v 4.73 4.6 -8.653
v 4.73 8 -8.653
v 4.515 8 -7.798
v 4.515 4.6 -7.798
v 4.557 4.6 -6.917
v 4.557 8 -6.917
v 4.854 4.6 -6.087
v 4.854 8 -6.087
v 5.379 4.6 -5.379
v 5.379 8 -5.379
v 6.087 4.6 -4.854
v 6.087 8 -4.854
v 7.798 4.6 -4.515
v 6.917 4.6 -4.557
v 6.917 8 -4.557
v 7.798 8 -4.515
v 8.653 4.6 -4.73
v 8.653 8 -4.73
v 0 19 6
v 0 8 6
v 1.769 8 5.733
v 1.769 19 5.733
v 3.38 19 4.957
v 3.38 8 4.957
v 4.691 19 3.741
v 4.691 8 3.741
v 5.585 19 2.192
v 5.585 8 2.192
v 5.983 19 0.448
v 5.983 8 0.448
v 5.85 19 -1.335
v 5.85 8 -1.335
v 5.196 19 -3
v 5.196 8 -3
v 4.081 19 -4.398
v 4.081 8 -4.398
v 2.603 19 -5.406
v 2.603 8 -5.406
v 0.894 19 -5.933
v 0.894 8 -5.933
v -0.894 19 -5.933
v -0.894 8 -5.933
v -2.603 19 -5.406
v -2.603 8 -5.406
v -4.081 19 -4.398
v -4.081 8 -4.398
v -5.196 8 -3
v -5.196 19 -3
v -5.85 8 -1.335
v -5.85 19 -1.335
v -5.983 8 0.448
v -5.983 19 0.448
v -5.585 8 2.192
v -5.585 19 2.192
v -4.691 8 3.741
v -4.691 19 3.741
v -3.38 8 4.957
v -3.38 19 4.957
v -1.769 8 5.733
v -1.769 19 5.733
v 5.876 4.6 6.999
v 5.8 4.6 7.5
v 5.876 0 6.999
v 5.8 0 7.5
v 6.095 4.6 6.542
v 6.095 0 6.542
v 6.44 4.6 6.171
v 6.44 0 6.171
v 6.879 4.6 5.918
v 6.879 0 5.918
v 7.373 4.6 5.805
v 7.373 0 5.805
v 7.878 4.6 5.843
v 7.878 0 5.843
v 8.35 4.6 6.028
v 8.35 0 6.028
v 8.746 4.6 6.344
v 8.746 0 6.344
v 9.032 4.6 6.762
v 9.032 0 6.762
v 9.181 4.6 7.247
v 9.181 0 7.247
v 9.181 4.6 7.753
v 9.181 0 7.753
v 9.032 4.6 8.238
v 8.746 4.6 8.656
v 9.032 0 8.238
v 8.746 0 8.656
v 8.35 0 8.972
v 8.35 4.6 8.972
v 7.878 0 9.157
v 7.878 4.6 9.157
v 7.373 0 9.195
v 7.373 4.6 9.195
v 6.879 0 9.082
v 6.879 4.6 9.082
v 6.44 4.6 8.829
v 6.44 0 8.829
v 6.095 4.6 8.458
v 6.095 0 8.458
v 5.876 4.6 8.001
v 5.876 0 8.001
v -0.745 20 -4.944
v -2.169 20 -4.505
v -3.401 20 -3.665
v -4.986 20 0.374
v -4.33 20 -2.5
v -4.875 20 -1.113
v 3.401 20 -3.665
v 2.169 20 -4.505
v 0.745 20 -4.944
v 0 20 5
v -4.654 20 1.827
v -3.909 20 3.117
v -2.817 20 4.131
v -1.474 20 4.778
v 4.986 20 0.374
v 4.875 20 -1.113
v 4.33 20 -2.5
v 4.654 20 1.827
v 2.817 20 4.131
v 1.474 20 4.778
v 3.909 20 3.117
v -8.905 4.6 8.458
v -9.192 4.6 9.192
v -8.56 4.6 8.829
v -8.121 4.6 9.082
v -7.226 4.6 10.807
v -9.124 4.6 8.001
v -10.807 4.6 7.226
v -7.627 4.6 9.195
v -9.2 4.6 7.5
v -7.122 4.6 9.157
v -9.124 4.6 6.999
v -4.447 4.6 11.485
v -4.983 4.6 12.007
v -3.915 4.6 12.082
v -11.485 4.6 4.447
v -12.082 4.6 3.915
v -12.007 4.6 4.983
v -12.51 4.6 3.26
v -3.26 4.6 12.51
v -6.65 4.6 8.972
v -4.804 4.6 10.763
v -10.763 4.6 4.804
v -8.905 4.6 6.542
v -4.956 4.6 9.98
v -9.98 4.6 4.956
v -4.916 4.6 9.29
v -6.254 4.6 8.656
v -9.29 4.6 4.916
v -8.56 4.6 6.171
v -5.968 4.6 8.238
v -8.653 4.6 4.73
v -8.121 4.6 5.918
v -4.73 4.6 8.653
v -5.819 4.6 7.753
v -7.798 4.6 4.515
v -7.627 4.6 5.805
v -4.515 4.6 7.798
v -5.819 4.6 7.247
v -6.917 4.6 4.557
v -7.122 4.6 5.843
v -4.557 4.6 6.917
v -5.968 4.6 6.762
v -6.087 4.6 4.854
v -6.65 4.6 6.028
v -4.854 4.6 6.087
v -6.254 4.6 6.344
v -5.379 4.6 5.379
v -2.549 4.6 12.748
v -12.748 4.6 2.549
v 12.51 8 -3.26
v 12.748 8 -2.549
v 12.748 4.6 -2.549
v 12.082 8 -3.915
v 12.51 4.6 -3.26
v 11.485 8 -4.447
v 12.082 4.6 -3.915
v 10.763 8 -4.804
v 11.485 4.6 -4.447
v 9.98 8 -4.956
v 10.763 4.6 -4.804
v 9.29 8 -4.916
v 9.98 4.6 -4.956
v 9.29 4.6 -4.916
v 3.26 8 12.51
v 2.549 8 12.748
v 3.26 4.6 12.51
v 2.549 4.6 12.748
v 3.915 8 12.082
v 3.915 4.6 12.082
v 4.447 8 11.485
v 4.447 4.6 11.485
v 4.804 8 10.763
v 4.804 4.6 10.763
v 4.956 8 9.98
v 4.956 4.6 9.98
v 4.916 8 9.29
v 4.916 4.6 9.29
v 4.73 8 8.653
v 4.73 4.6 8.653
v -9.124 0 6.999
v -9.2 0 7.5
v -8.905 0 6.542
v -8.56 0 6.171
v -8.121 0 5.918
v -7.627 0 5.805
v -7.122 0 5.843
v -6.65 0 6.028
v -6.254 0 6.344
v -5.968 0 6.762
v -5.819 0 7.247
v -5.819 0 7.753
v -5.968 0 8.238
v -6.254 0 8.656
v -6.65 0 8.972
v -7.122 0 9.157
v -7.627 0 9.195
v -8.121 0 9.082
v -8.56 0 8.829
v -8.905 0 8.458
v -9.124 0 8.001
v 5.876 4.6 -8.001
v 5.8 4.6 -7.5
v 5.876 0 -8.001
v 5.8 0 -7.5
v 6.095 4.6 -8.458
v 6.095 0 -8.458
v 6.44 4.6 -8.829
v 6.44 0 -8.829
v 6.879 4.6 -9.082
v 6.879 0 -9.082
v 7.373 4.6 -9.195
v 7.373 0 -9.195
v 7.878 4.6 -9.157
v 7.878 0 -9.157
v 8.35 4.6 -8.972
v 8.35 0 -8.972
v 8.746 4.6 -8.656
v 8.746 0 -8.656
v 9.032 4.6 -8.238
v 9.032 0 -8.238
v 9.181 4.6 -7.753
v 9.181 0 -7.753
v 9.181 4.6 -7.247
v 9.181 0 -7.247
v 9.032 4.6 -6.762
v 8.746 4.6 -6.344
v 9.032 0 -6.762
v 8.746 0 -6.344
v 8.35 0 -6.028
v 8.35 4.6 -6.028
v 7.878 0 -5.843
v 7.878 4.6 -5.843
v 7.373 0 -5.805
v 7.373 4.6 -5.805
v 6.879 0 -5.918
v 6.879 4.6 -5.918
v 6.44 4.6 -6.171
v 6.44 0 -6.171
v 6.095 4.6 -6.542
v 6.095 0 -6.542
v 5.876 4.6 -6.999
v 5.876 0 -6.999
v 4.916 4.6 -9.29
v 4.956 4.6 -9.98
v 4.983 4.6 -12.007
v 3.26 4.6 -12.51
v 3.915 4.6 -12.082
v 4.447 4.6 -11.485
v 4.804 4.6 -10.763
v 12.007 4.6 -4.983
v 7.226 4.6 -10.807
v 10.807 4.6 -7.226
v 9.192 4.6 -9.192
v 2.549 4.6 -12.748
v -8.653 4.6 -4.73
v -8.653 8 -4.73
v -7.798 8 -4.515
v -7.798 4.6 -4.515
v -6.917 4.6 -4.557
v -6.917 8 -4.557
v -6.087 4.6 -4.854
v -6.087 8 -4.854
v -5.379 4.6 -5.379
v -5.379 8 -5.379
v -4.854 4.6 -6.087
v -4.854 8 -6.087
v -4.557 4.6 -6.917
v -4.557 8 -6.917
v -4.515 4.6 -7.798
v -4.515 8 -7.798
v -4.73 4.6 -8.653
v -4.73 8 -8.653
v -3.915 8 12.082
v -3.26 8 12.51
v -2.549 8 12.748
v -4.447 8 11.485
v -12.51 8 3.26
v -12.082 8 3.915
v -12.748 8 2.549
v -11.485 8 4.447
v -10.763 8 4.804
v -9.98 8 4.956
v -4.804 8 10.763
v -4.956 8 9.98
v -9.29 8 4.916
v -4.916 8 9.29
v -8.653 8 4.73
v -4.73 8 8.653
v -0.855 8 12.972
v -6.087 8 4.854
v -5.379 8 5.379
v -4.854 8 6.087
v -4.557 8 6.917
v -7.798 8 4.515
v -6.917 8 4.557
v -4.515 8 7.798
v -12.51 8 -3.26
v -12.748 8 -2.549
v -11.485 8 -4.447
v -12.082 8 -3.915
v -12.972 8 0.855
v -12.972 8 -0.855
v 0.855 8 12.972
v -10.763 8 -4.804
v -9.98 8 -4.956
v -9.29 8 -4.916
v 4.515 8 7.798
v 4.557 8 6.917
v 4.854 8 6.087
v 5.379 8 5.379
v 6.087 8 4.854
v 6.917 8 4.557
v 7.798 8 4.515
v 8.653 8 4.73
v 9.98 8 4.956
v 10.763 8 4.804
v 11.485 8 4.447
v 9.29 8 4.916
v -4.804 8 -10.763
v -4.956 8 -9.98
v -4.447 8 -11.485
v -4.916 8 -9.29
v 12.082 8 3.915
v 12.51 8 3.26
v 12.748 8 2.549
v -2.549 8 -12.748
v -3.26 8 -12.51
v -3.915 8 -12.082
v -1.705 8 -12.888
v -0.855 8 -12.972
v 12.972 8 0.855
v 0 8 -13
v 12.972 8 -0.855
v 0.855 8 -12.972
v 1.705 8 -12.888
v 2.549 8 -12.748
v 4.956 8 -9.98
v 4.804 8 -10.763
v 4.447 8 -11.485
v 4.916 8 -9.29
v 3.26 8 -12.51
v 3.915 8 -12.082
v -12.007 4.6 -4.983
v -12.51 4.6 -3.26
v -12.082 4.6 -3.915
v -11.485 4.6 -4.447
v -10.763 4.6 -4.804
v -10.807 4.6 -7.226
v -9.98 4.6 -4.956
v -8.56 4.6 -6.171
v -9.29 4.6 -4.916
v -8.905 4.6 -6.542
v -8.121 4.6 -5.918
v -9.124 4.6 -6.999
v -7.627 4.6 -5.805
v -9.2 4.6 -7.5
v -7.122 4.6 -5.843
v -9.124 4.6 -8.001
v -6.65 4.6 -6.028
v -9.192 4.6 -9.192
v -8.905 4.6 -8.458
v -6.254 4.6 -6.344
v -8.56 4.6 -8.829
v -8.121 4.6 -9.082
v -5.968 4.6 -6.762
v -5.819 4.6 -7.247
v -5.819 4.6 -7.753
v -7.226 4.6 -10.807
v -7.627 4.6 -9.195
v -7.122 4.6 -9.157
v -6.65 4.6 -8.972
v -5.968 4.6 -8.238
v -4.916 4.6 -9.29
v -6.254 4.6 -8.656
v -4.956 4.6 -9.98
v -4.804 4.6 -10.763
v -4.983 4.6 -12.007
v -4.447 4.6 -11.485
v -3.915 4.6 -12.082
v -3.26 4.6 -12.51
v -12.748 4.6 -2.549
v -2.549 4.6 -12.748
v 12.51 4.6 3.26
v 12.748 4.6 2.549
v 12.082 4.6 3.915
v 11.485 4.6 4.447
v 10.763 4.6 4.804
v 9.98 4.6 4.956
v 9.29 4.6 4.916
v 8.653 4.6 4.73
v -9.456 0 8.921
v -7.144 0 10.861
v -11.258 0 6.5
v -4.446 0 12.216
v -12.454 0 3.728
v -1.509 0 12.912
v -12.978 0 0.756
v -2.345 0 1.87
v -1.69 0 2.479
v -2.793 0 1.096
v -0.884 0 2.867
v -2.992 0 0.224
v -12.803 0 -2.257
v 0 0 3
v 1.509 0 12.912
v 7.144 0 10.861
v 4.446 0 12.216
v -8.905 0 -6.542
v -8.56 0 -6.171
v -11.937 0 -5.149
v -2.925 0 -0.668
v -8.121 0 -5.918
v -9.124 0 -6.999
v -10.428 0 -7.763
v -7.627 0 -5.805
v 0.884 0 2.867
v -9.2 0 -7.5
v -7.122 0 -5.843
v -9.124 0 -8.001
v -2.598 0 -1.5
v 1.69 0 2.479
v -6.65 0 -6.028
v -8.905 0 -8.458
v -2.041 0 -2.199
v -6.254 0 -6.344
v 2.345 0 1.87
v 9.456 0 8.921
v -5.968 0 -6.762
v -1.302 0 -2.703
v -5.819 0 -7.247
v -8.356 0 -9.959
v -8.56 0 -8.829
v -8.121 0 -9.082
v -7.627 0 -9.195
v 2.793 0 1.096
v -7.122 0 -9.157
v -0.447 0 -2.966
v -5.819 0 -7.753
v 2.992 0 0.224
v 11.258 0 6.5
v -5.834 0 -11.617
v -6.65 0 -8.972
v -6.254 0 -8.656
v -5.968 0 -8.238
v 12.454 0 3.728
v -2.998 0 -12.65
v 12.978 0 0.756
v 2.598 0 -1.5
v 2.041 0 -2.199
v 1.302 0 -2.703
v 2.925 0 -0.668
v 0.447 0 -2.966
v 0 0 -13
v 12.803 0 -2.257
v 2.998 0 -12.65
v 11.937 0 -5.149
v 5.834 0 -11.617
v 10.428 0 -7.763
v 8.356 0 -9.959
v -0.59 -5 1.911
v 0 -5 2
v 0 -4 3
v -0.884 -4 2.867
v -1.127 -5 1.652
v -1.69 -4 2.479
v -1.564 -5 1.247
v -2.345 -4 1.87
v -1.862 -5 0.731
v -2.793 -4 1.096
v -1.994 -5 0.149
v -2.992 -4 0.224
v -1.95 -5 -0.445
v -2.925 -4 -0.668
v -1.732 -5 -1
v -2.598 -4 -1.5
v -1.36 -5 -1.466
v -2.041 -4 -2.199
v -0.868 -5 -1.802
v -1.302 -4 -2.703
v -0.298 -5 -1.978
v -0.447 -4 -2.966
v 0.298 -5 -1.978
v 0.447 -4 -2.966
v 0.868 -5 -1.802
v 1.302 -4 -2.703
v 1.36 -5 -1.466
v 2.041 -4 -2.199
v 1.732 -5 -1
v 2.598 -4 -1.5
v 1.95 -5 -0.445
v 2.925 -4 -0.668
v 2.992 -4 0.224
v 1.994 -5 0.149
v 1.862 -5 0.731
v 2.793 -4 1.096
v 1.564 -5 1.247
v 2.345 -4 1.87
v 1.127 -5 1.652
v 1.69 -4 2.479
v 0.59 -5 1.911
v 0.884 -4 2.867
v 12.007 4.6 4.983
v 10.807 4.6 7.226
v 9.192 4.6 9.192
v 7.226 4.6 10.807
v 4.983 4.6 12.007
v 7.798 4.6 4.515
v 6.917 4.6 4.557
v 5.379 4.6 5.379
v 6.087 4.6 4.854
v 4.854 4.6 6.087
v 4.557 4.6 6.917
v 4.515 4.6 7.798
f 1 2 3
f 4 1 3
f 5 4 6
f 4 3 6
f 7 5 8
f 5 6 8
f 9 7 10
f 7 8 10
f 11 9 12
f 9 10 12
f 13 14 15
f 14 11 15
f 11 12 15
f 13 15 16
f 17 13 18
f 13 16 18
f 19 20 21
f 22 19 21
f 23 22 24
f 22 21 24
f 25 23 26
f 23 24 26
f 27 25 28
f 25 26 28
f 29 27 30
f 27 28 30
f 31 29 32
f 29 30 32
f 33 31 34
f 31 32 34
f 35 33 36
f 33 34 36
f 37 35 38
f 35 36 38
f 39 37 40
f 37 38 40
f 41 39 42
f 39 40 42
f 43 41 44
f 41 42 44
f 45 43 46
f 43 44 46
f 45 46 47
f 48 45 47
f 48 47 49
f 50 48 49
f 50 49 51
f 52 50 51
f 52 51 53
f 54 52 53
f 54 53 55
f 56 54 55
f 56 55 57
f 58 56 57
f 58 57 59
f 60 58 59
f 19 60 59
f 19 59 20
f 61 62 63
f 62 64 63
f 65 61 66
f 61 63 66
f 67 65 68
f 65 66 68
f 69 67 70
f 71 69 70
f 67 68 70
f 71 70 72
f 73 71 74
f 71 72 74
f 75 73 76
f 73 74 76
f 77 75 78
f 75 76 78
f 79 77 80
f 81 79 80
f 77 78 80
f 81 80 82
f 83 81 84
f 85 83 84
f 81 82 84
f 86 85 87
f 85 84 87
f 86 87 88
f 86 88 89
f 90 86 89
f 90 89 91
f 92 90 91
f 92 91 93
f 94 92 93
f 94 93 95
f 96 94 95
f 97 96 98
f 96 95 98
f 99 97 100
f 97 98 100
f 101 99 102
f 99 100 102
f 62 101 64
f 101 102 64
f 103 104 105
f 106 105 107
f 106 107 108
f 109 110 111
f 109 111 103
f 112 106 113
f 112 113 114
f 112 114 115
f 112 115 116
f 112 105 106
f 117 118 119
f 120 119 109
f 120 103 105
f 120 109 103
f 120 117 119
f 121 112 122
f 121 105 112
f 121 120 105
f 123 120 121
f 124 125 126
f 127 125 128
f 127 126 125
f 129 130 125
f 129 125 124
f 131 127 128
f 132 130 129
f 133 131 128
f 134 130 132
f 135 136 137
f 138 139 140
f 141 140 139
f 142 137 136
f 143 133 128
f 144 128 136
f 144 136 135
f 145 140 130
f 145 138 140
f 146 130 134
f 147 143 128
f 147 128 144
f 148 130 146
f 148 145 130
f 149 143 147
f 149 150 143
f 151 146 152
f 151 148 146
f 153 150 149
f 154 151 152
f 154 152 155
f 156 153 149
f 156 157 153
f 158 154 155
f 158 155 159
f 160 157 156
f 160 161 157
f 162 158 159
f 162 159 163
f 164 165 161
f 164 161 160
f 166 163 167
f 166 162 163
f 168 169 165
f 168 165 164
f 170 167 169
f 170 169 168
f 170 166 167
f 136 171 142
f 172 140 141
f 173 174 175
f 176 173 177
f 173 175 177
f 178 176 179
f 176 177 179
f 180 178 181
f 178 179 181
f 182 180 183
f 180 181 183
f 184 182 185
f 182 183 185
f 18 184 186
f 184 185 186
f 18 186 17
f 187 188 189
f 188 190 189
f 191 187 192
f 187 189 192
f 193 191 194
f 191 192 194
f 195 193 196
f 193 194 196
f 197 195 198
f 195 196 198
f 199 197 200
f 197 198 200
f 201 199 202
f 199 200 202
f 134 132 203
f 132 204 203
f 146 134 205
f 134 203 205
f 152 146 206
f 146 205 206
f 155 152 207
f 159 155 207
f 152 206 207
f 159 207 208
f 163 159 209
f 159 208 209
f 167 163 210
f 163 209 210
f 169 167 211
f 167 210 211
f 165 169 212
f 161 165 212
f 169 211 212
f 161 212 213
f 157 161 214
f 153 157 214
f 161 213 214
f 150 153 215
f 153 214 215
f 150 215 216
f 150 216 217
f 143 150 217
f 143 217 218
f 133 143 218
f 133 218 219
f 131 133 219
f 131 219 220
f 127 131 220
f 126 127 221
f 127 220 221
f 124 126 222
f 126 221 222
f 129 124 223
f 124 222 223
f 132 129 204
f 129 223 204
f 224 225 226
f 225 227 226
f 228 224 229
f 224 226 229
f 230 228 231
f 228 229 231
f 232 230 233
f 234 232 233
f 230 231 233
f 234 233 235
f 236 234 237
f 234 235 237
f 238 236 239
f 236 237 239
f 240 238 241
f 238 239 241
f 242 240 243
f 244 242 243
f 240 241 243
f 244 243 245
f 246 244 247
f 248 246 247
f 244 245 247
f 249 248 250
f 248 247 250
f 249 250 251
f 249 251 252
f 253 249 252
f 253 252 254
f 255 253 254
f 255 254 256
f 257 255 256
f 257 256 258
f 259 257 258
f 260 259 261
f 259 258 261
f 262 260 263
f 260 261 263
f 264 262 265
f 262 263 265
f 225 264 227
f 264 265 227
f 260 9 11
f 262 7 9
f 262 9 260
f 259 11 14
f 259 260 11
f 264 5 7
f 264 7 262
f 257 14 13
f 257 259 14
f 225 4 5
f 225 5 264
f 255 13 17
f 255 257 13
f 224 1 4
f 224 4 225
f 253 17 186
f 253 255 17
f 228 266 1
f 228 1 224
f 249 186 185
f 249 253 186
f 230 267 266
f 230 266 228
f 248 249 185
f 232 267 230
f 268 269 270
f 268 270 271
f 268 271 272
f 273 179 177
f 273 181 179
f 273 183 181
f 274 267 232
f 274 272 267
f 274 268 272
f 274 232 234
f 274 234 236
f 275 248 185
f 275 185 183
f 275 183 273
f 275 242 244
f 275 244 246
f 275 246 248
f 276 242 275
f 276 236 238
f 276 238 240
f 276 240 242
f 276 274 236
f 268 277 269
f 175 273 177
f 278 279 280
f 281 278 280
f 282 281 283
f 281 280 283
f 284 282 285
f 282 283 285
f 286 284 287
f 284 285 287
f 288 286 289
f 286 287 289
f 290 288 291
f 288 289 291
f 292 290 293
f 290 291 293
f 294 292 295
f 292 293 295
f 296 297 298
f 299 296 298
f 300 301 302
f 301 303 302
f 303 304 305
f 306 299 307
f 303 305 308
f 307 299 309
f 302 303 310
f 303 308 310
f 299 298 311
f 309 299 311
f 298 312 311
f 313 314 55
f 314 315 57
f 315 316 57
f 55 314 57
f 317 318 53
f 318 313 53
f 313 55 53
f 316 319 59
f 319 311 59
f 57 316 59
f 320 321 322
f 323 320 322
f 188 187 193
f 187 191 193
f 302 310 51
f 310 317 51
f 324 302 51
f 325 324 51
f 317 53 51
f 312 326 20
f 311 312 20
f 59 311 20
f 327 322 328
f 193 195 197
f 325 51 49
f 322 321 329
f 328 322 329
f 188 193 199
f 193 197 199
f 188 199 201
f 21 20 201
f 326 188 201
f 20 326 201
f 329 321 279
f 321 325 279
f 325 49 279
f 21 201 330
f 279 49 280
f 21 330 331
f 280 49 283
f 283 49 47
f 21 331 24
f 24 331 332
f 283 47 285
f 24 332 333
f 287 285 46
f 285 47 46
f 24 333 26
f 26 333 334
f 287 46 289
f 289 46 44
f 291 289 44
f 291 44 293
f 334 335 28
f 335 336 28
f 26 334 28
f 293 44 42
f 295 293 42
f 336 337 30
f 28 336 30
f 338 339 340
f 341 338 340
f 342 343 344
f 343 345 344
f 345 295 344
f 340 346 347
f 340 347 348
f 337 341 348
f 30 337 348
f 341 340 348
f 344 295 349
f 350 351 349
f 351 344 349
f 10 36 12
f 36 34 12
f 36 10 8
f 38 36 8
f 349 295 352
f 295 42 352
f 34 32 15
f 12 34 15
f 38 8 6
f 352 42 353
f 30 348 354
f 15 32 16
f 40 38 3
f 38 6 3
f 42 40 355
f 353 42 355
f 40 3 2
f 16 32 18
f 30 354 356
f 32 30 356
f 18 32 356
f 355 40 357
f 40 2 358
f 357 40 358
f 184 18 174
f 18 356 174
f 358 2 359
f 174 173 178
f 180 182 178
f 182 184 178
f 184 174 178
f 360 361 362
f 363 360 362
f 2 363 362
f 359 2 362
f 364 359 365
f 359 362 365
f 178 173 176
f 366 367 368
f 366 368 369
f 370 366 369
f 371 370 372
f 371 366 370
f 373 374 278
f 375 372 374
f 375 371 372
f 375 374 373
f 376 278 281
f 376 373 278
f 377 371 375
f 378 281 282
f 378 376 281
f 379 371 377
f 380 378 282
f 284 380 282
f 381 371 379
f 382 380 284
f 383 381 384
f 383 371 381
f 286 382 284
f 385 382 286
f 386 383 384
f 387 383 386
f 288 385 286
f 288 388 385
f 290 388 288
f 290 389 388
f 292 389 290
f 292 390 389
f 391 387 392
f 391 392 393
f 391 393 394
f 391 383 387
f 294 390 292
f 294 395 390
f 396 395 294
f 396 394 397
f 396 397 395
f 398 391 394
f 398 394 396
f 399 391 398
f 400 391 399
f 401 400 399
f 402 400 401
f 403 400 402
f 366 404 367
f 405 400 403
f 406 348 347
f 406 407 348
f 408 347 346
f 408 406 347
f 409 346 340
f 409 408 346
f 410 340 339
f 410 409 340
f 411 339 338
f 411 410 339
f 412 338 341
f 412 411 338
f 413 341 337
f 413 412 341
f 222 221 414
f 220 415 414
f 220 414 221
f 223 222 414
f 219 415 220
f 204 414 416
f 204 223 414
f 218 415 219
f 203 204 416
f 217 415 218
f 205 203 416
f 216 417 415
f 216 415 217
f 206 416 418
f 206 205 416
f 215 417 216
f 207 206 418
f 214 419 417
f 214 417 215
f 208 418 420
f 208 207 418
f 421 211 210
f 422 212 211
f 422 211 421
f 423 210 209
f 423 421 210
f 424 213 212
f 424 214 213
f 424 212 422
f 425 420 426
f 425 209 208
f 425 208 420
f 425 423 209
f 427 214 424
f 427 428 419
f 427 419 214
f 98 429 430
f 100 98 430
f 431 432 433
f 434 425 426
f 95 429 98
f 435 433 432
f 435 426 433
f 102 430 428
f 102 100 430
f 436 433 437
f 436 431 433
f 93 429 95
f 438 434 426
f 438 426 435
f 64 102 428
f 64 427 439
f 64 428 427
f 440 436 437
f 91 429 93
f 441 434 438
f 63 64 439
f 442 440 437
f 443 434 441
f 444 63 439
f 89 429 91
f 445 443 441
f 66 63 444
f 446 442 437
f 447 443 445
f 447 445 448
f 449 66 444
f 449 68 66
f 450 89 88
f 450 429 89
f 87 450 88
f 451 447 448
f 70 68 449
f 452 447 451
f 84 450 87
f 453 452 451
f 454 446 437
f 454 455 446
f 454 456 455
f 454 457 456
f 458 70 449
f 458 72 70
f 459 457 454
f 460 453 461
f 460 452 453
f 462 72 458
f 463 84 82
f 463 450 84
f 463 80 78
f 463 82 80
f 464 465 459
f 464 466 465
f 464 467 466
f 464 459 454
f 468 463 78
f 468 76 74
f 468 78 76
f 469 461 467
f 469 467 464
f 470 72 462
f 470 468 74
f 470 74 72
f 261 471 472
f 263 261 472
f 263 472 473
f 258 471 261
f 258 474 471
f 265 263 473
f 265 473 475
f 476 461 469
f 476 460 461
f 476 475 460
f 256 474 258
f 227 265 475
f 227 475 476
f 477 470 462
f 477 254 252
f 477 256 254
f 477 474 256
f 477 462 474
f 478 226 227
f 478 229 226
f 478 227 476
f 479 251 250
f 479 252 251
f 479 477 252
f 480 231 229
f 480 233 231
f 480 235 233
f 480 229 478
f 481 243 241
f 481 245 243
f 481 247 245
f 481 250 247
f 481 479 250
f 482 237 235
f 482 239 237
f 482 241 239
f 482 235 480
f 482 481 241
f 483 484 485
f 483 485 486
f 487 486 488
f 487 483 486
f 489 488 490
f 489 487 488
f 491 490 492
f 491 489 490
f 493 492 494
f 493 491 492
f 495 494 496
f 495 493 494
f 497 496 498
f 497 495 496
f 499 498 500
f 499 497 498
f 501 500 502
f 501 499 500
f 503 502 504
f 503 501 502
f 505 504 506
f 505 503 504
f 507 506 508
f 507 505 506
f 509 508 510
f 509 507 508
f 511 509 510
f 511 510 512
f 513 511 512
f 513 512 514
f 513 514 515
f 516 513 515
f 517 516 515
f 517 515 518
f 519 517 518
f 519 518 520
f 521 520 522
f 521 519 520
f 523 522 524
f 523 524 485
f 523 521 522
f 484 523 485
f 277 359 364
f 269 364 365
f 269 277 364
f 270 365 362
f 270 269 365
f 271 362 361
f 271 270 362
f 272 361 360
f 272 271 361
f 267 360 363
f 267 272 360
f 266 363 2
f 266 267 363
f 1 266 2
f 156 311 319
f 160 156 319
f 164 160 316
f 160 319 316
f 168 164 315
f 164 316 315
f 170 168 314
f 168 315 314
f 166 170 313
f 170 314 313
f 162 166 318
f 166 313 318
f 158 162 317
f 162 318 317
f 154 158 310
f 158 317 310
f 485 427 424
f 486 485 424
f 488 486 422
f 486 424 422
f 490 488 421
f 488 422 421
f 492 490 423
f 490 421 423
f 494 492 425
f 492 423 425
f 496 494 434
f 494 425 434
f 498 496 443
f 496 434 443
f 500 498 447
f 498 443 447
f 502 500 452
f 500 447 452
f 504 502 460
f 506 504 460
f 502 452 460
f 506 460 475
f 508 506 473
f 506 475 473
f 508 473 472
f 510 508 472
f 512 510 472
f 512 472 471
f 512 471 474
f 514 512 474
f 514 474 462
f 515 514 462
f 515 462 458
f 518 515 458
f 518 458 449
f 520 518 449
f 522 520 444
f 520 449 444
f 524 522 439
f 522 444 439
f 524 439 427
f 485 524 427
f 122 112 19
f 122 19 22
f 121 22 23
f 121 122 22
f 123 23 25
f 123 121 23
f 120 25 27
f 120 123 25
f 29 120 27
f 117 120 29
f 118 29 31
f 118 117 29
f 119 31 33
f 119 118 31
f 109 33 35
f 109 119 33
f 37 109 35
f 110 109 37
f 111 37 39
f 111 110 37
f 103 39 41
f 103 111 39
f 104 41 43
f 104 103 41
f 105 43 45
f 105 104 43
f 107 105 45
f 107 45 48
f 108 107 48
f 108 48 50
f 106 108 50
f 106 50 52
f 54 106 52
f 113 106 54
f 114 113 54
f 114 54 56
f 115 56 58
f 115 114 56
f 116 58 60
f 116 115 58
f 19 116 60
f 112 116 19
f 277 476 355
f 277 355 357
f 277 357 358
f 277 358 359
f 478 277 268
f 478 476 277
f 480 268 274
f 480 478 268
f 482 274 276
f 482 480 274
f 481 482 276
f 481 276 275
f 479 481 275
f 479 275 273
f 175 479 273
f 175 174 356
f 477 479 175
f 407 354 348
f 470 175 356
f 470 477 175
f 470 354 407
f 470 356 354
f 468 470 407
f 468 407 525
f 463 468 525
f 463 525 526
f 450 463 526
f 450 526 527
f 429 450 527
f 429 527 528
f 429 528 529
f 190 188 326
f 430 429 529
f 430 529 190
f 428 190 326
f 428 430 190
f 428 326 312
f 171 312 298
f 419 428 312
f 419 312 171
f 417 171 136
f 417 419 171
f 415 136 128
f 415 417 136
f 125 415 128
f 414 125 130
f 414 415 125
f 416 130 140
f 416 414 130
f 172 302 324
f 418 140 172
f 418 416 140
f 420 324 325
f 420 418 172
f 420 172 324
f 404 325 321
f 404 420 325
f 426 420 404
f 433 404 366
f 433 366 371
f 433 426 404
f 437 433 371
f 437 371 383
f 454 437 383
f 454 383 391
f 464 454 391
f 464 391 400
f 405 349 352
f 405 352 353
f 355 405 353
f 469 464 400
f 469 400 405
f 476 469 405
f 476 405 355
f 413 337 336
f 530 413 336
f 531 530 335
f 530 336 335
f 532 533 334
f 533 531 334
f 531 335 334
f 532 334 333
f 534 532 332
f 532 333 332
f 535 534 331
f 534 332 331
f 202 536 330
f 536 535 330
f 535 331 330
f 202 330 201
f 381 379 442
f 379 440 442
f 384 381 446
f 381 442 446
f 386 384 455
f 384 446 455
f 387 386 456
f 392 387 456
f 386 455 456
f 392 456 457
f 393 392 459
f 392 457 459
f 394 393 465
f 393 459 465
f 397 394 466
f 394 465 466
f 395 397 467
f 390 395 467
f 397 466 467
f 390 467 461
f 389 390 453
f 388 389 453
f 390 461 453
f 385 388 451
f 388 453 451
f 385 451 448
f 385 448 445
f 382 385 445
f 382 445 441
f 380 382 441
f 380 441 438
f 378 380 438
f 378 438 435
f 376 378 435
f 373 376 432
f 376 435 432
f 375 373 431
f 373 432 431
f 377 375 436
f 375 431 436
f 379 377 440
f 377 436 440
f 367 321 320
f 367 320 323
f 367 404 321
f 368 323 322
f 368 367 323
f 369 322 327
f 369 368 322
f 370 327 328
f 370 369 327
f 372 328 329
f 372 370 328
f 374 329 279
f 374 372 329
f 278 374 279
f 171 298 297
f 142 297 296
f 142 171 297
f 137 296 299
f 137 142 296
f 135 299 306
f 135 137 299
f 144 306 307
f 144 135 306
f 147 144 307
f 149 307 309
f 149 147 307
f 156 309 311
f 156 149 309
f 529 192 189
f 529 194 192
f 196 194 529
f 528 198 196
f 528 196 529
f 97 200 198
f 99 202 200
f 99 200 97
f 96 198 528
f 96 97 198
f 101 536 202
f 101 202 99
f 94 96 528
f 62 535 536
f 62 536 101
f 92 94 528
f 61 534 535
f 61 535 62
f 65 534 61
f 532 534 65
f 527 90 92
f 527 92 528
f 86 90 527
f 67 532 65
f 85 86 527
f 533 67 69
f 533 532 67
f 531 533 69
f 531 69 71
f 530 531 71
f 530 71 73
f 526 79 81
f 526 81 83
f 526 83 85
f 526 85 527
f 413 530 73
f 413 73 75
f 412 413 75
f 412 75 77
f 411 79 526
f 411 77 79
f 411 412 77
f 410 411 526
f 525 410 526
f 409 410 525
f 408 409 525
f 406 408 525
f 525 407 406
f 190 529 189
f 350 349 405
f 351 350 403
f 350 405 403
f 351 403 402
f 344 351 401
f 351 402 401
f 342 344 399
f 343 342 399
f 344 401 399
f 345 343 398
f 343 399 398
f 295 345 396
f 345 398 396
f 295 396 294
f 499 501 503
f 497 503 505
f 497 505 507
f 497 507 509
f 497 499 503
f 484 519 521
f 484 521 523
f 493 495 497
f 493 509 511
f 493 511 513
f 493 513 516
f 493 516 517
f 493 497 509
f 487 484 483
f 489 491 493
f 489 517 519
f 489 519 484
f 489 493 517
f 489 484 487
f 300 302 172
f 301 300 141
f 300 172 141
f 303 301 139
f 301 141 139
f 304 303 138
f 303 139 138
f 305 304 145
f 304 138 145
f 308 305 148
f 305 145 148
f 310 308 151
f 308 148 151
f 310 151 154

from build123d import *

# Parameters (mm, degrees)
SKETCH1_R                                            = 6
BOSS_EXTRUDE1_DEPTH                                  = 20
SKETCH3_R                                            = 13
BOSS_EXTRUDE2_DEPTH                                  = 8
CBORE_FOR_M3_HEXAGON_SOCKET_HEAD_CAP_SCR_D           = 3.4
CBORE_FOR_M3_HEXAGON_SOCKET_HEAD_CAP_SCR_CBORE_D     = 6
CBORE_FOR_M3_HEXAGON_SOCKET_HEAD_CAP_SCR_CBORE_DEPTH = 3.4
FILLET1_R                                            = 3
CHAMFER1_SIZE                                        = 1
SKETCH7_R                                            = 3
BOSS_EXTRUDE3_DEPTH                                  = 5
CHAMFER2_SIZE                                        = 1


with BuildPart() as part:
    # Sketch1 → Boss-Extrude1 (new body)
    with BuildSketch(Plane(origin=(0, 0, 0), x_dir=(1, 0, 0), z_dir=(0, 1, 0))):
        with Locations(Location((0, 0, 0), (0, 0, 270))):
            Circle(SKETCH1_R)
    extrude(amount=BOSS_EXTRUDE1_DEPTH)

    # Sketch3 → Boss-Extrude2 (add)
    with BuildSketch(Plane.XZ):
        with Locations(Location((0, 0, 0), (0, 0, 270))):
            Circle(SKETCH3_R)
    extrude(amount=-BOSS_EXTRUDE2_DEPTH)

    # CBORE for M3 Hexagon socket head cap screws1 (through all)
    with Locations(Plane(origin=(0, 8, 0), x_dir=(1, 0, 0), z_dir=(0, 1, 0))):
        with Locations((-7.5, 7.5), (-7.5, -7.5), (7.5, -7.5), (7.5, 7.5)):
            CounterBoreHole(CBORE_FOR_M3_HEXAGON_SOCKET_HEAD_CAP_SCR_D / 2, CBORE_FOR_M3_HEXAGON_SOCKET_HEAD_CAP_SCR_CBORE_D / 2, CBORE_FOR_M3_HEXAGON_SOCKET_HEAD_CAP_SCR_CBORE_DEPTH)

    # Fillet1
    fillet1_edges = [part.edges().sort_by_distance(p)[0] for p in [
        (10.495089529, 6.3, -7.671577138),
        (7.671577138, 6.3, -10.495089529),
        (7.671577138, 6.3, 10.495089529),
        (10.495089529, 6.3, 7.671577138),
        (-7.671577138, 6.3, 10.495089529),
        (-10.495089529, 6.3, 7.671577138),
        (-7.671577138, 6.3, -10.495089529),
        (-10.495089529, 6.3, -7.671577138),
    ]]
    fillet(fillet1_edges, radius=FILLET1_R)

    # Chamfer1
    chamfer1_edges = [part.edges().sort_by_distance(p)[0] for p in [
        (0, 20, -6),
    ]]
    chamfer(chamfer1_edges, length=CHAMFER1_SIZE)

    # Sketch7 → Boss-Extrude3 (add)
    with BuildSketch(Plane.XZ):
        with Locations(Location((0, 0, 0), (0, 0, 90))):
            Circle(SKETCH7_R)
    extrude(amount=BOSS_EXTRUDE3_DEPTH)

    # Chamfer2
    chamfer2_edges = [part.edges().sort_by_distance(p)[0] for p in [
        (0, -5, -3),
    ]]
    chamfer(chamfer2_edges, length=CHAMFER2_SIZE)


solid = part.part
